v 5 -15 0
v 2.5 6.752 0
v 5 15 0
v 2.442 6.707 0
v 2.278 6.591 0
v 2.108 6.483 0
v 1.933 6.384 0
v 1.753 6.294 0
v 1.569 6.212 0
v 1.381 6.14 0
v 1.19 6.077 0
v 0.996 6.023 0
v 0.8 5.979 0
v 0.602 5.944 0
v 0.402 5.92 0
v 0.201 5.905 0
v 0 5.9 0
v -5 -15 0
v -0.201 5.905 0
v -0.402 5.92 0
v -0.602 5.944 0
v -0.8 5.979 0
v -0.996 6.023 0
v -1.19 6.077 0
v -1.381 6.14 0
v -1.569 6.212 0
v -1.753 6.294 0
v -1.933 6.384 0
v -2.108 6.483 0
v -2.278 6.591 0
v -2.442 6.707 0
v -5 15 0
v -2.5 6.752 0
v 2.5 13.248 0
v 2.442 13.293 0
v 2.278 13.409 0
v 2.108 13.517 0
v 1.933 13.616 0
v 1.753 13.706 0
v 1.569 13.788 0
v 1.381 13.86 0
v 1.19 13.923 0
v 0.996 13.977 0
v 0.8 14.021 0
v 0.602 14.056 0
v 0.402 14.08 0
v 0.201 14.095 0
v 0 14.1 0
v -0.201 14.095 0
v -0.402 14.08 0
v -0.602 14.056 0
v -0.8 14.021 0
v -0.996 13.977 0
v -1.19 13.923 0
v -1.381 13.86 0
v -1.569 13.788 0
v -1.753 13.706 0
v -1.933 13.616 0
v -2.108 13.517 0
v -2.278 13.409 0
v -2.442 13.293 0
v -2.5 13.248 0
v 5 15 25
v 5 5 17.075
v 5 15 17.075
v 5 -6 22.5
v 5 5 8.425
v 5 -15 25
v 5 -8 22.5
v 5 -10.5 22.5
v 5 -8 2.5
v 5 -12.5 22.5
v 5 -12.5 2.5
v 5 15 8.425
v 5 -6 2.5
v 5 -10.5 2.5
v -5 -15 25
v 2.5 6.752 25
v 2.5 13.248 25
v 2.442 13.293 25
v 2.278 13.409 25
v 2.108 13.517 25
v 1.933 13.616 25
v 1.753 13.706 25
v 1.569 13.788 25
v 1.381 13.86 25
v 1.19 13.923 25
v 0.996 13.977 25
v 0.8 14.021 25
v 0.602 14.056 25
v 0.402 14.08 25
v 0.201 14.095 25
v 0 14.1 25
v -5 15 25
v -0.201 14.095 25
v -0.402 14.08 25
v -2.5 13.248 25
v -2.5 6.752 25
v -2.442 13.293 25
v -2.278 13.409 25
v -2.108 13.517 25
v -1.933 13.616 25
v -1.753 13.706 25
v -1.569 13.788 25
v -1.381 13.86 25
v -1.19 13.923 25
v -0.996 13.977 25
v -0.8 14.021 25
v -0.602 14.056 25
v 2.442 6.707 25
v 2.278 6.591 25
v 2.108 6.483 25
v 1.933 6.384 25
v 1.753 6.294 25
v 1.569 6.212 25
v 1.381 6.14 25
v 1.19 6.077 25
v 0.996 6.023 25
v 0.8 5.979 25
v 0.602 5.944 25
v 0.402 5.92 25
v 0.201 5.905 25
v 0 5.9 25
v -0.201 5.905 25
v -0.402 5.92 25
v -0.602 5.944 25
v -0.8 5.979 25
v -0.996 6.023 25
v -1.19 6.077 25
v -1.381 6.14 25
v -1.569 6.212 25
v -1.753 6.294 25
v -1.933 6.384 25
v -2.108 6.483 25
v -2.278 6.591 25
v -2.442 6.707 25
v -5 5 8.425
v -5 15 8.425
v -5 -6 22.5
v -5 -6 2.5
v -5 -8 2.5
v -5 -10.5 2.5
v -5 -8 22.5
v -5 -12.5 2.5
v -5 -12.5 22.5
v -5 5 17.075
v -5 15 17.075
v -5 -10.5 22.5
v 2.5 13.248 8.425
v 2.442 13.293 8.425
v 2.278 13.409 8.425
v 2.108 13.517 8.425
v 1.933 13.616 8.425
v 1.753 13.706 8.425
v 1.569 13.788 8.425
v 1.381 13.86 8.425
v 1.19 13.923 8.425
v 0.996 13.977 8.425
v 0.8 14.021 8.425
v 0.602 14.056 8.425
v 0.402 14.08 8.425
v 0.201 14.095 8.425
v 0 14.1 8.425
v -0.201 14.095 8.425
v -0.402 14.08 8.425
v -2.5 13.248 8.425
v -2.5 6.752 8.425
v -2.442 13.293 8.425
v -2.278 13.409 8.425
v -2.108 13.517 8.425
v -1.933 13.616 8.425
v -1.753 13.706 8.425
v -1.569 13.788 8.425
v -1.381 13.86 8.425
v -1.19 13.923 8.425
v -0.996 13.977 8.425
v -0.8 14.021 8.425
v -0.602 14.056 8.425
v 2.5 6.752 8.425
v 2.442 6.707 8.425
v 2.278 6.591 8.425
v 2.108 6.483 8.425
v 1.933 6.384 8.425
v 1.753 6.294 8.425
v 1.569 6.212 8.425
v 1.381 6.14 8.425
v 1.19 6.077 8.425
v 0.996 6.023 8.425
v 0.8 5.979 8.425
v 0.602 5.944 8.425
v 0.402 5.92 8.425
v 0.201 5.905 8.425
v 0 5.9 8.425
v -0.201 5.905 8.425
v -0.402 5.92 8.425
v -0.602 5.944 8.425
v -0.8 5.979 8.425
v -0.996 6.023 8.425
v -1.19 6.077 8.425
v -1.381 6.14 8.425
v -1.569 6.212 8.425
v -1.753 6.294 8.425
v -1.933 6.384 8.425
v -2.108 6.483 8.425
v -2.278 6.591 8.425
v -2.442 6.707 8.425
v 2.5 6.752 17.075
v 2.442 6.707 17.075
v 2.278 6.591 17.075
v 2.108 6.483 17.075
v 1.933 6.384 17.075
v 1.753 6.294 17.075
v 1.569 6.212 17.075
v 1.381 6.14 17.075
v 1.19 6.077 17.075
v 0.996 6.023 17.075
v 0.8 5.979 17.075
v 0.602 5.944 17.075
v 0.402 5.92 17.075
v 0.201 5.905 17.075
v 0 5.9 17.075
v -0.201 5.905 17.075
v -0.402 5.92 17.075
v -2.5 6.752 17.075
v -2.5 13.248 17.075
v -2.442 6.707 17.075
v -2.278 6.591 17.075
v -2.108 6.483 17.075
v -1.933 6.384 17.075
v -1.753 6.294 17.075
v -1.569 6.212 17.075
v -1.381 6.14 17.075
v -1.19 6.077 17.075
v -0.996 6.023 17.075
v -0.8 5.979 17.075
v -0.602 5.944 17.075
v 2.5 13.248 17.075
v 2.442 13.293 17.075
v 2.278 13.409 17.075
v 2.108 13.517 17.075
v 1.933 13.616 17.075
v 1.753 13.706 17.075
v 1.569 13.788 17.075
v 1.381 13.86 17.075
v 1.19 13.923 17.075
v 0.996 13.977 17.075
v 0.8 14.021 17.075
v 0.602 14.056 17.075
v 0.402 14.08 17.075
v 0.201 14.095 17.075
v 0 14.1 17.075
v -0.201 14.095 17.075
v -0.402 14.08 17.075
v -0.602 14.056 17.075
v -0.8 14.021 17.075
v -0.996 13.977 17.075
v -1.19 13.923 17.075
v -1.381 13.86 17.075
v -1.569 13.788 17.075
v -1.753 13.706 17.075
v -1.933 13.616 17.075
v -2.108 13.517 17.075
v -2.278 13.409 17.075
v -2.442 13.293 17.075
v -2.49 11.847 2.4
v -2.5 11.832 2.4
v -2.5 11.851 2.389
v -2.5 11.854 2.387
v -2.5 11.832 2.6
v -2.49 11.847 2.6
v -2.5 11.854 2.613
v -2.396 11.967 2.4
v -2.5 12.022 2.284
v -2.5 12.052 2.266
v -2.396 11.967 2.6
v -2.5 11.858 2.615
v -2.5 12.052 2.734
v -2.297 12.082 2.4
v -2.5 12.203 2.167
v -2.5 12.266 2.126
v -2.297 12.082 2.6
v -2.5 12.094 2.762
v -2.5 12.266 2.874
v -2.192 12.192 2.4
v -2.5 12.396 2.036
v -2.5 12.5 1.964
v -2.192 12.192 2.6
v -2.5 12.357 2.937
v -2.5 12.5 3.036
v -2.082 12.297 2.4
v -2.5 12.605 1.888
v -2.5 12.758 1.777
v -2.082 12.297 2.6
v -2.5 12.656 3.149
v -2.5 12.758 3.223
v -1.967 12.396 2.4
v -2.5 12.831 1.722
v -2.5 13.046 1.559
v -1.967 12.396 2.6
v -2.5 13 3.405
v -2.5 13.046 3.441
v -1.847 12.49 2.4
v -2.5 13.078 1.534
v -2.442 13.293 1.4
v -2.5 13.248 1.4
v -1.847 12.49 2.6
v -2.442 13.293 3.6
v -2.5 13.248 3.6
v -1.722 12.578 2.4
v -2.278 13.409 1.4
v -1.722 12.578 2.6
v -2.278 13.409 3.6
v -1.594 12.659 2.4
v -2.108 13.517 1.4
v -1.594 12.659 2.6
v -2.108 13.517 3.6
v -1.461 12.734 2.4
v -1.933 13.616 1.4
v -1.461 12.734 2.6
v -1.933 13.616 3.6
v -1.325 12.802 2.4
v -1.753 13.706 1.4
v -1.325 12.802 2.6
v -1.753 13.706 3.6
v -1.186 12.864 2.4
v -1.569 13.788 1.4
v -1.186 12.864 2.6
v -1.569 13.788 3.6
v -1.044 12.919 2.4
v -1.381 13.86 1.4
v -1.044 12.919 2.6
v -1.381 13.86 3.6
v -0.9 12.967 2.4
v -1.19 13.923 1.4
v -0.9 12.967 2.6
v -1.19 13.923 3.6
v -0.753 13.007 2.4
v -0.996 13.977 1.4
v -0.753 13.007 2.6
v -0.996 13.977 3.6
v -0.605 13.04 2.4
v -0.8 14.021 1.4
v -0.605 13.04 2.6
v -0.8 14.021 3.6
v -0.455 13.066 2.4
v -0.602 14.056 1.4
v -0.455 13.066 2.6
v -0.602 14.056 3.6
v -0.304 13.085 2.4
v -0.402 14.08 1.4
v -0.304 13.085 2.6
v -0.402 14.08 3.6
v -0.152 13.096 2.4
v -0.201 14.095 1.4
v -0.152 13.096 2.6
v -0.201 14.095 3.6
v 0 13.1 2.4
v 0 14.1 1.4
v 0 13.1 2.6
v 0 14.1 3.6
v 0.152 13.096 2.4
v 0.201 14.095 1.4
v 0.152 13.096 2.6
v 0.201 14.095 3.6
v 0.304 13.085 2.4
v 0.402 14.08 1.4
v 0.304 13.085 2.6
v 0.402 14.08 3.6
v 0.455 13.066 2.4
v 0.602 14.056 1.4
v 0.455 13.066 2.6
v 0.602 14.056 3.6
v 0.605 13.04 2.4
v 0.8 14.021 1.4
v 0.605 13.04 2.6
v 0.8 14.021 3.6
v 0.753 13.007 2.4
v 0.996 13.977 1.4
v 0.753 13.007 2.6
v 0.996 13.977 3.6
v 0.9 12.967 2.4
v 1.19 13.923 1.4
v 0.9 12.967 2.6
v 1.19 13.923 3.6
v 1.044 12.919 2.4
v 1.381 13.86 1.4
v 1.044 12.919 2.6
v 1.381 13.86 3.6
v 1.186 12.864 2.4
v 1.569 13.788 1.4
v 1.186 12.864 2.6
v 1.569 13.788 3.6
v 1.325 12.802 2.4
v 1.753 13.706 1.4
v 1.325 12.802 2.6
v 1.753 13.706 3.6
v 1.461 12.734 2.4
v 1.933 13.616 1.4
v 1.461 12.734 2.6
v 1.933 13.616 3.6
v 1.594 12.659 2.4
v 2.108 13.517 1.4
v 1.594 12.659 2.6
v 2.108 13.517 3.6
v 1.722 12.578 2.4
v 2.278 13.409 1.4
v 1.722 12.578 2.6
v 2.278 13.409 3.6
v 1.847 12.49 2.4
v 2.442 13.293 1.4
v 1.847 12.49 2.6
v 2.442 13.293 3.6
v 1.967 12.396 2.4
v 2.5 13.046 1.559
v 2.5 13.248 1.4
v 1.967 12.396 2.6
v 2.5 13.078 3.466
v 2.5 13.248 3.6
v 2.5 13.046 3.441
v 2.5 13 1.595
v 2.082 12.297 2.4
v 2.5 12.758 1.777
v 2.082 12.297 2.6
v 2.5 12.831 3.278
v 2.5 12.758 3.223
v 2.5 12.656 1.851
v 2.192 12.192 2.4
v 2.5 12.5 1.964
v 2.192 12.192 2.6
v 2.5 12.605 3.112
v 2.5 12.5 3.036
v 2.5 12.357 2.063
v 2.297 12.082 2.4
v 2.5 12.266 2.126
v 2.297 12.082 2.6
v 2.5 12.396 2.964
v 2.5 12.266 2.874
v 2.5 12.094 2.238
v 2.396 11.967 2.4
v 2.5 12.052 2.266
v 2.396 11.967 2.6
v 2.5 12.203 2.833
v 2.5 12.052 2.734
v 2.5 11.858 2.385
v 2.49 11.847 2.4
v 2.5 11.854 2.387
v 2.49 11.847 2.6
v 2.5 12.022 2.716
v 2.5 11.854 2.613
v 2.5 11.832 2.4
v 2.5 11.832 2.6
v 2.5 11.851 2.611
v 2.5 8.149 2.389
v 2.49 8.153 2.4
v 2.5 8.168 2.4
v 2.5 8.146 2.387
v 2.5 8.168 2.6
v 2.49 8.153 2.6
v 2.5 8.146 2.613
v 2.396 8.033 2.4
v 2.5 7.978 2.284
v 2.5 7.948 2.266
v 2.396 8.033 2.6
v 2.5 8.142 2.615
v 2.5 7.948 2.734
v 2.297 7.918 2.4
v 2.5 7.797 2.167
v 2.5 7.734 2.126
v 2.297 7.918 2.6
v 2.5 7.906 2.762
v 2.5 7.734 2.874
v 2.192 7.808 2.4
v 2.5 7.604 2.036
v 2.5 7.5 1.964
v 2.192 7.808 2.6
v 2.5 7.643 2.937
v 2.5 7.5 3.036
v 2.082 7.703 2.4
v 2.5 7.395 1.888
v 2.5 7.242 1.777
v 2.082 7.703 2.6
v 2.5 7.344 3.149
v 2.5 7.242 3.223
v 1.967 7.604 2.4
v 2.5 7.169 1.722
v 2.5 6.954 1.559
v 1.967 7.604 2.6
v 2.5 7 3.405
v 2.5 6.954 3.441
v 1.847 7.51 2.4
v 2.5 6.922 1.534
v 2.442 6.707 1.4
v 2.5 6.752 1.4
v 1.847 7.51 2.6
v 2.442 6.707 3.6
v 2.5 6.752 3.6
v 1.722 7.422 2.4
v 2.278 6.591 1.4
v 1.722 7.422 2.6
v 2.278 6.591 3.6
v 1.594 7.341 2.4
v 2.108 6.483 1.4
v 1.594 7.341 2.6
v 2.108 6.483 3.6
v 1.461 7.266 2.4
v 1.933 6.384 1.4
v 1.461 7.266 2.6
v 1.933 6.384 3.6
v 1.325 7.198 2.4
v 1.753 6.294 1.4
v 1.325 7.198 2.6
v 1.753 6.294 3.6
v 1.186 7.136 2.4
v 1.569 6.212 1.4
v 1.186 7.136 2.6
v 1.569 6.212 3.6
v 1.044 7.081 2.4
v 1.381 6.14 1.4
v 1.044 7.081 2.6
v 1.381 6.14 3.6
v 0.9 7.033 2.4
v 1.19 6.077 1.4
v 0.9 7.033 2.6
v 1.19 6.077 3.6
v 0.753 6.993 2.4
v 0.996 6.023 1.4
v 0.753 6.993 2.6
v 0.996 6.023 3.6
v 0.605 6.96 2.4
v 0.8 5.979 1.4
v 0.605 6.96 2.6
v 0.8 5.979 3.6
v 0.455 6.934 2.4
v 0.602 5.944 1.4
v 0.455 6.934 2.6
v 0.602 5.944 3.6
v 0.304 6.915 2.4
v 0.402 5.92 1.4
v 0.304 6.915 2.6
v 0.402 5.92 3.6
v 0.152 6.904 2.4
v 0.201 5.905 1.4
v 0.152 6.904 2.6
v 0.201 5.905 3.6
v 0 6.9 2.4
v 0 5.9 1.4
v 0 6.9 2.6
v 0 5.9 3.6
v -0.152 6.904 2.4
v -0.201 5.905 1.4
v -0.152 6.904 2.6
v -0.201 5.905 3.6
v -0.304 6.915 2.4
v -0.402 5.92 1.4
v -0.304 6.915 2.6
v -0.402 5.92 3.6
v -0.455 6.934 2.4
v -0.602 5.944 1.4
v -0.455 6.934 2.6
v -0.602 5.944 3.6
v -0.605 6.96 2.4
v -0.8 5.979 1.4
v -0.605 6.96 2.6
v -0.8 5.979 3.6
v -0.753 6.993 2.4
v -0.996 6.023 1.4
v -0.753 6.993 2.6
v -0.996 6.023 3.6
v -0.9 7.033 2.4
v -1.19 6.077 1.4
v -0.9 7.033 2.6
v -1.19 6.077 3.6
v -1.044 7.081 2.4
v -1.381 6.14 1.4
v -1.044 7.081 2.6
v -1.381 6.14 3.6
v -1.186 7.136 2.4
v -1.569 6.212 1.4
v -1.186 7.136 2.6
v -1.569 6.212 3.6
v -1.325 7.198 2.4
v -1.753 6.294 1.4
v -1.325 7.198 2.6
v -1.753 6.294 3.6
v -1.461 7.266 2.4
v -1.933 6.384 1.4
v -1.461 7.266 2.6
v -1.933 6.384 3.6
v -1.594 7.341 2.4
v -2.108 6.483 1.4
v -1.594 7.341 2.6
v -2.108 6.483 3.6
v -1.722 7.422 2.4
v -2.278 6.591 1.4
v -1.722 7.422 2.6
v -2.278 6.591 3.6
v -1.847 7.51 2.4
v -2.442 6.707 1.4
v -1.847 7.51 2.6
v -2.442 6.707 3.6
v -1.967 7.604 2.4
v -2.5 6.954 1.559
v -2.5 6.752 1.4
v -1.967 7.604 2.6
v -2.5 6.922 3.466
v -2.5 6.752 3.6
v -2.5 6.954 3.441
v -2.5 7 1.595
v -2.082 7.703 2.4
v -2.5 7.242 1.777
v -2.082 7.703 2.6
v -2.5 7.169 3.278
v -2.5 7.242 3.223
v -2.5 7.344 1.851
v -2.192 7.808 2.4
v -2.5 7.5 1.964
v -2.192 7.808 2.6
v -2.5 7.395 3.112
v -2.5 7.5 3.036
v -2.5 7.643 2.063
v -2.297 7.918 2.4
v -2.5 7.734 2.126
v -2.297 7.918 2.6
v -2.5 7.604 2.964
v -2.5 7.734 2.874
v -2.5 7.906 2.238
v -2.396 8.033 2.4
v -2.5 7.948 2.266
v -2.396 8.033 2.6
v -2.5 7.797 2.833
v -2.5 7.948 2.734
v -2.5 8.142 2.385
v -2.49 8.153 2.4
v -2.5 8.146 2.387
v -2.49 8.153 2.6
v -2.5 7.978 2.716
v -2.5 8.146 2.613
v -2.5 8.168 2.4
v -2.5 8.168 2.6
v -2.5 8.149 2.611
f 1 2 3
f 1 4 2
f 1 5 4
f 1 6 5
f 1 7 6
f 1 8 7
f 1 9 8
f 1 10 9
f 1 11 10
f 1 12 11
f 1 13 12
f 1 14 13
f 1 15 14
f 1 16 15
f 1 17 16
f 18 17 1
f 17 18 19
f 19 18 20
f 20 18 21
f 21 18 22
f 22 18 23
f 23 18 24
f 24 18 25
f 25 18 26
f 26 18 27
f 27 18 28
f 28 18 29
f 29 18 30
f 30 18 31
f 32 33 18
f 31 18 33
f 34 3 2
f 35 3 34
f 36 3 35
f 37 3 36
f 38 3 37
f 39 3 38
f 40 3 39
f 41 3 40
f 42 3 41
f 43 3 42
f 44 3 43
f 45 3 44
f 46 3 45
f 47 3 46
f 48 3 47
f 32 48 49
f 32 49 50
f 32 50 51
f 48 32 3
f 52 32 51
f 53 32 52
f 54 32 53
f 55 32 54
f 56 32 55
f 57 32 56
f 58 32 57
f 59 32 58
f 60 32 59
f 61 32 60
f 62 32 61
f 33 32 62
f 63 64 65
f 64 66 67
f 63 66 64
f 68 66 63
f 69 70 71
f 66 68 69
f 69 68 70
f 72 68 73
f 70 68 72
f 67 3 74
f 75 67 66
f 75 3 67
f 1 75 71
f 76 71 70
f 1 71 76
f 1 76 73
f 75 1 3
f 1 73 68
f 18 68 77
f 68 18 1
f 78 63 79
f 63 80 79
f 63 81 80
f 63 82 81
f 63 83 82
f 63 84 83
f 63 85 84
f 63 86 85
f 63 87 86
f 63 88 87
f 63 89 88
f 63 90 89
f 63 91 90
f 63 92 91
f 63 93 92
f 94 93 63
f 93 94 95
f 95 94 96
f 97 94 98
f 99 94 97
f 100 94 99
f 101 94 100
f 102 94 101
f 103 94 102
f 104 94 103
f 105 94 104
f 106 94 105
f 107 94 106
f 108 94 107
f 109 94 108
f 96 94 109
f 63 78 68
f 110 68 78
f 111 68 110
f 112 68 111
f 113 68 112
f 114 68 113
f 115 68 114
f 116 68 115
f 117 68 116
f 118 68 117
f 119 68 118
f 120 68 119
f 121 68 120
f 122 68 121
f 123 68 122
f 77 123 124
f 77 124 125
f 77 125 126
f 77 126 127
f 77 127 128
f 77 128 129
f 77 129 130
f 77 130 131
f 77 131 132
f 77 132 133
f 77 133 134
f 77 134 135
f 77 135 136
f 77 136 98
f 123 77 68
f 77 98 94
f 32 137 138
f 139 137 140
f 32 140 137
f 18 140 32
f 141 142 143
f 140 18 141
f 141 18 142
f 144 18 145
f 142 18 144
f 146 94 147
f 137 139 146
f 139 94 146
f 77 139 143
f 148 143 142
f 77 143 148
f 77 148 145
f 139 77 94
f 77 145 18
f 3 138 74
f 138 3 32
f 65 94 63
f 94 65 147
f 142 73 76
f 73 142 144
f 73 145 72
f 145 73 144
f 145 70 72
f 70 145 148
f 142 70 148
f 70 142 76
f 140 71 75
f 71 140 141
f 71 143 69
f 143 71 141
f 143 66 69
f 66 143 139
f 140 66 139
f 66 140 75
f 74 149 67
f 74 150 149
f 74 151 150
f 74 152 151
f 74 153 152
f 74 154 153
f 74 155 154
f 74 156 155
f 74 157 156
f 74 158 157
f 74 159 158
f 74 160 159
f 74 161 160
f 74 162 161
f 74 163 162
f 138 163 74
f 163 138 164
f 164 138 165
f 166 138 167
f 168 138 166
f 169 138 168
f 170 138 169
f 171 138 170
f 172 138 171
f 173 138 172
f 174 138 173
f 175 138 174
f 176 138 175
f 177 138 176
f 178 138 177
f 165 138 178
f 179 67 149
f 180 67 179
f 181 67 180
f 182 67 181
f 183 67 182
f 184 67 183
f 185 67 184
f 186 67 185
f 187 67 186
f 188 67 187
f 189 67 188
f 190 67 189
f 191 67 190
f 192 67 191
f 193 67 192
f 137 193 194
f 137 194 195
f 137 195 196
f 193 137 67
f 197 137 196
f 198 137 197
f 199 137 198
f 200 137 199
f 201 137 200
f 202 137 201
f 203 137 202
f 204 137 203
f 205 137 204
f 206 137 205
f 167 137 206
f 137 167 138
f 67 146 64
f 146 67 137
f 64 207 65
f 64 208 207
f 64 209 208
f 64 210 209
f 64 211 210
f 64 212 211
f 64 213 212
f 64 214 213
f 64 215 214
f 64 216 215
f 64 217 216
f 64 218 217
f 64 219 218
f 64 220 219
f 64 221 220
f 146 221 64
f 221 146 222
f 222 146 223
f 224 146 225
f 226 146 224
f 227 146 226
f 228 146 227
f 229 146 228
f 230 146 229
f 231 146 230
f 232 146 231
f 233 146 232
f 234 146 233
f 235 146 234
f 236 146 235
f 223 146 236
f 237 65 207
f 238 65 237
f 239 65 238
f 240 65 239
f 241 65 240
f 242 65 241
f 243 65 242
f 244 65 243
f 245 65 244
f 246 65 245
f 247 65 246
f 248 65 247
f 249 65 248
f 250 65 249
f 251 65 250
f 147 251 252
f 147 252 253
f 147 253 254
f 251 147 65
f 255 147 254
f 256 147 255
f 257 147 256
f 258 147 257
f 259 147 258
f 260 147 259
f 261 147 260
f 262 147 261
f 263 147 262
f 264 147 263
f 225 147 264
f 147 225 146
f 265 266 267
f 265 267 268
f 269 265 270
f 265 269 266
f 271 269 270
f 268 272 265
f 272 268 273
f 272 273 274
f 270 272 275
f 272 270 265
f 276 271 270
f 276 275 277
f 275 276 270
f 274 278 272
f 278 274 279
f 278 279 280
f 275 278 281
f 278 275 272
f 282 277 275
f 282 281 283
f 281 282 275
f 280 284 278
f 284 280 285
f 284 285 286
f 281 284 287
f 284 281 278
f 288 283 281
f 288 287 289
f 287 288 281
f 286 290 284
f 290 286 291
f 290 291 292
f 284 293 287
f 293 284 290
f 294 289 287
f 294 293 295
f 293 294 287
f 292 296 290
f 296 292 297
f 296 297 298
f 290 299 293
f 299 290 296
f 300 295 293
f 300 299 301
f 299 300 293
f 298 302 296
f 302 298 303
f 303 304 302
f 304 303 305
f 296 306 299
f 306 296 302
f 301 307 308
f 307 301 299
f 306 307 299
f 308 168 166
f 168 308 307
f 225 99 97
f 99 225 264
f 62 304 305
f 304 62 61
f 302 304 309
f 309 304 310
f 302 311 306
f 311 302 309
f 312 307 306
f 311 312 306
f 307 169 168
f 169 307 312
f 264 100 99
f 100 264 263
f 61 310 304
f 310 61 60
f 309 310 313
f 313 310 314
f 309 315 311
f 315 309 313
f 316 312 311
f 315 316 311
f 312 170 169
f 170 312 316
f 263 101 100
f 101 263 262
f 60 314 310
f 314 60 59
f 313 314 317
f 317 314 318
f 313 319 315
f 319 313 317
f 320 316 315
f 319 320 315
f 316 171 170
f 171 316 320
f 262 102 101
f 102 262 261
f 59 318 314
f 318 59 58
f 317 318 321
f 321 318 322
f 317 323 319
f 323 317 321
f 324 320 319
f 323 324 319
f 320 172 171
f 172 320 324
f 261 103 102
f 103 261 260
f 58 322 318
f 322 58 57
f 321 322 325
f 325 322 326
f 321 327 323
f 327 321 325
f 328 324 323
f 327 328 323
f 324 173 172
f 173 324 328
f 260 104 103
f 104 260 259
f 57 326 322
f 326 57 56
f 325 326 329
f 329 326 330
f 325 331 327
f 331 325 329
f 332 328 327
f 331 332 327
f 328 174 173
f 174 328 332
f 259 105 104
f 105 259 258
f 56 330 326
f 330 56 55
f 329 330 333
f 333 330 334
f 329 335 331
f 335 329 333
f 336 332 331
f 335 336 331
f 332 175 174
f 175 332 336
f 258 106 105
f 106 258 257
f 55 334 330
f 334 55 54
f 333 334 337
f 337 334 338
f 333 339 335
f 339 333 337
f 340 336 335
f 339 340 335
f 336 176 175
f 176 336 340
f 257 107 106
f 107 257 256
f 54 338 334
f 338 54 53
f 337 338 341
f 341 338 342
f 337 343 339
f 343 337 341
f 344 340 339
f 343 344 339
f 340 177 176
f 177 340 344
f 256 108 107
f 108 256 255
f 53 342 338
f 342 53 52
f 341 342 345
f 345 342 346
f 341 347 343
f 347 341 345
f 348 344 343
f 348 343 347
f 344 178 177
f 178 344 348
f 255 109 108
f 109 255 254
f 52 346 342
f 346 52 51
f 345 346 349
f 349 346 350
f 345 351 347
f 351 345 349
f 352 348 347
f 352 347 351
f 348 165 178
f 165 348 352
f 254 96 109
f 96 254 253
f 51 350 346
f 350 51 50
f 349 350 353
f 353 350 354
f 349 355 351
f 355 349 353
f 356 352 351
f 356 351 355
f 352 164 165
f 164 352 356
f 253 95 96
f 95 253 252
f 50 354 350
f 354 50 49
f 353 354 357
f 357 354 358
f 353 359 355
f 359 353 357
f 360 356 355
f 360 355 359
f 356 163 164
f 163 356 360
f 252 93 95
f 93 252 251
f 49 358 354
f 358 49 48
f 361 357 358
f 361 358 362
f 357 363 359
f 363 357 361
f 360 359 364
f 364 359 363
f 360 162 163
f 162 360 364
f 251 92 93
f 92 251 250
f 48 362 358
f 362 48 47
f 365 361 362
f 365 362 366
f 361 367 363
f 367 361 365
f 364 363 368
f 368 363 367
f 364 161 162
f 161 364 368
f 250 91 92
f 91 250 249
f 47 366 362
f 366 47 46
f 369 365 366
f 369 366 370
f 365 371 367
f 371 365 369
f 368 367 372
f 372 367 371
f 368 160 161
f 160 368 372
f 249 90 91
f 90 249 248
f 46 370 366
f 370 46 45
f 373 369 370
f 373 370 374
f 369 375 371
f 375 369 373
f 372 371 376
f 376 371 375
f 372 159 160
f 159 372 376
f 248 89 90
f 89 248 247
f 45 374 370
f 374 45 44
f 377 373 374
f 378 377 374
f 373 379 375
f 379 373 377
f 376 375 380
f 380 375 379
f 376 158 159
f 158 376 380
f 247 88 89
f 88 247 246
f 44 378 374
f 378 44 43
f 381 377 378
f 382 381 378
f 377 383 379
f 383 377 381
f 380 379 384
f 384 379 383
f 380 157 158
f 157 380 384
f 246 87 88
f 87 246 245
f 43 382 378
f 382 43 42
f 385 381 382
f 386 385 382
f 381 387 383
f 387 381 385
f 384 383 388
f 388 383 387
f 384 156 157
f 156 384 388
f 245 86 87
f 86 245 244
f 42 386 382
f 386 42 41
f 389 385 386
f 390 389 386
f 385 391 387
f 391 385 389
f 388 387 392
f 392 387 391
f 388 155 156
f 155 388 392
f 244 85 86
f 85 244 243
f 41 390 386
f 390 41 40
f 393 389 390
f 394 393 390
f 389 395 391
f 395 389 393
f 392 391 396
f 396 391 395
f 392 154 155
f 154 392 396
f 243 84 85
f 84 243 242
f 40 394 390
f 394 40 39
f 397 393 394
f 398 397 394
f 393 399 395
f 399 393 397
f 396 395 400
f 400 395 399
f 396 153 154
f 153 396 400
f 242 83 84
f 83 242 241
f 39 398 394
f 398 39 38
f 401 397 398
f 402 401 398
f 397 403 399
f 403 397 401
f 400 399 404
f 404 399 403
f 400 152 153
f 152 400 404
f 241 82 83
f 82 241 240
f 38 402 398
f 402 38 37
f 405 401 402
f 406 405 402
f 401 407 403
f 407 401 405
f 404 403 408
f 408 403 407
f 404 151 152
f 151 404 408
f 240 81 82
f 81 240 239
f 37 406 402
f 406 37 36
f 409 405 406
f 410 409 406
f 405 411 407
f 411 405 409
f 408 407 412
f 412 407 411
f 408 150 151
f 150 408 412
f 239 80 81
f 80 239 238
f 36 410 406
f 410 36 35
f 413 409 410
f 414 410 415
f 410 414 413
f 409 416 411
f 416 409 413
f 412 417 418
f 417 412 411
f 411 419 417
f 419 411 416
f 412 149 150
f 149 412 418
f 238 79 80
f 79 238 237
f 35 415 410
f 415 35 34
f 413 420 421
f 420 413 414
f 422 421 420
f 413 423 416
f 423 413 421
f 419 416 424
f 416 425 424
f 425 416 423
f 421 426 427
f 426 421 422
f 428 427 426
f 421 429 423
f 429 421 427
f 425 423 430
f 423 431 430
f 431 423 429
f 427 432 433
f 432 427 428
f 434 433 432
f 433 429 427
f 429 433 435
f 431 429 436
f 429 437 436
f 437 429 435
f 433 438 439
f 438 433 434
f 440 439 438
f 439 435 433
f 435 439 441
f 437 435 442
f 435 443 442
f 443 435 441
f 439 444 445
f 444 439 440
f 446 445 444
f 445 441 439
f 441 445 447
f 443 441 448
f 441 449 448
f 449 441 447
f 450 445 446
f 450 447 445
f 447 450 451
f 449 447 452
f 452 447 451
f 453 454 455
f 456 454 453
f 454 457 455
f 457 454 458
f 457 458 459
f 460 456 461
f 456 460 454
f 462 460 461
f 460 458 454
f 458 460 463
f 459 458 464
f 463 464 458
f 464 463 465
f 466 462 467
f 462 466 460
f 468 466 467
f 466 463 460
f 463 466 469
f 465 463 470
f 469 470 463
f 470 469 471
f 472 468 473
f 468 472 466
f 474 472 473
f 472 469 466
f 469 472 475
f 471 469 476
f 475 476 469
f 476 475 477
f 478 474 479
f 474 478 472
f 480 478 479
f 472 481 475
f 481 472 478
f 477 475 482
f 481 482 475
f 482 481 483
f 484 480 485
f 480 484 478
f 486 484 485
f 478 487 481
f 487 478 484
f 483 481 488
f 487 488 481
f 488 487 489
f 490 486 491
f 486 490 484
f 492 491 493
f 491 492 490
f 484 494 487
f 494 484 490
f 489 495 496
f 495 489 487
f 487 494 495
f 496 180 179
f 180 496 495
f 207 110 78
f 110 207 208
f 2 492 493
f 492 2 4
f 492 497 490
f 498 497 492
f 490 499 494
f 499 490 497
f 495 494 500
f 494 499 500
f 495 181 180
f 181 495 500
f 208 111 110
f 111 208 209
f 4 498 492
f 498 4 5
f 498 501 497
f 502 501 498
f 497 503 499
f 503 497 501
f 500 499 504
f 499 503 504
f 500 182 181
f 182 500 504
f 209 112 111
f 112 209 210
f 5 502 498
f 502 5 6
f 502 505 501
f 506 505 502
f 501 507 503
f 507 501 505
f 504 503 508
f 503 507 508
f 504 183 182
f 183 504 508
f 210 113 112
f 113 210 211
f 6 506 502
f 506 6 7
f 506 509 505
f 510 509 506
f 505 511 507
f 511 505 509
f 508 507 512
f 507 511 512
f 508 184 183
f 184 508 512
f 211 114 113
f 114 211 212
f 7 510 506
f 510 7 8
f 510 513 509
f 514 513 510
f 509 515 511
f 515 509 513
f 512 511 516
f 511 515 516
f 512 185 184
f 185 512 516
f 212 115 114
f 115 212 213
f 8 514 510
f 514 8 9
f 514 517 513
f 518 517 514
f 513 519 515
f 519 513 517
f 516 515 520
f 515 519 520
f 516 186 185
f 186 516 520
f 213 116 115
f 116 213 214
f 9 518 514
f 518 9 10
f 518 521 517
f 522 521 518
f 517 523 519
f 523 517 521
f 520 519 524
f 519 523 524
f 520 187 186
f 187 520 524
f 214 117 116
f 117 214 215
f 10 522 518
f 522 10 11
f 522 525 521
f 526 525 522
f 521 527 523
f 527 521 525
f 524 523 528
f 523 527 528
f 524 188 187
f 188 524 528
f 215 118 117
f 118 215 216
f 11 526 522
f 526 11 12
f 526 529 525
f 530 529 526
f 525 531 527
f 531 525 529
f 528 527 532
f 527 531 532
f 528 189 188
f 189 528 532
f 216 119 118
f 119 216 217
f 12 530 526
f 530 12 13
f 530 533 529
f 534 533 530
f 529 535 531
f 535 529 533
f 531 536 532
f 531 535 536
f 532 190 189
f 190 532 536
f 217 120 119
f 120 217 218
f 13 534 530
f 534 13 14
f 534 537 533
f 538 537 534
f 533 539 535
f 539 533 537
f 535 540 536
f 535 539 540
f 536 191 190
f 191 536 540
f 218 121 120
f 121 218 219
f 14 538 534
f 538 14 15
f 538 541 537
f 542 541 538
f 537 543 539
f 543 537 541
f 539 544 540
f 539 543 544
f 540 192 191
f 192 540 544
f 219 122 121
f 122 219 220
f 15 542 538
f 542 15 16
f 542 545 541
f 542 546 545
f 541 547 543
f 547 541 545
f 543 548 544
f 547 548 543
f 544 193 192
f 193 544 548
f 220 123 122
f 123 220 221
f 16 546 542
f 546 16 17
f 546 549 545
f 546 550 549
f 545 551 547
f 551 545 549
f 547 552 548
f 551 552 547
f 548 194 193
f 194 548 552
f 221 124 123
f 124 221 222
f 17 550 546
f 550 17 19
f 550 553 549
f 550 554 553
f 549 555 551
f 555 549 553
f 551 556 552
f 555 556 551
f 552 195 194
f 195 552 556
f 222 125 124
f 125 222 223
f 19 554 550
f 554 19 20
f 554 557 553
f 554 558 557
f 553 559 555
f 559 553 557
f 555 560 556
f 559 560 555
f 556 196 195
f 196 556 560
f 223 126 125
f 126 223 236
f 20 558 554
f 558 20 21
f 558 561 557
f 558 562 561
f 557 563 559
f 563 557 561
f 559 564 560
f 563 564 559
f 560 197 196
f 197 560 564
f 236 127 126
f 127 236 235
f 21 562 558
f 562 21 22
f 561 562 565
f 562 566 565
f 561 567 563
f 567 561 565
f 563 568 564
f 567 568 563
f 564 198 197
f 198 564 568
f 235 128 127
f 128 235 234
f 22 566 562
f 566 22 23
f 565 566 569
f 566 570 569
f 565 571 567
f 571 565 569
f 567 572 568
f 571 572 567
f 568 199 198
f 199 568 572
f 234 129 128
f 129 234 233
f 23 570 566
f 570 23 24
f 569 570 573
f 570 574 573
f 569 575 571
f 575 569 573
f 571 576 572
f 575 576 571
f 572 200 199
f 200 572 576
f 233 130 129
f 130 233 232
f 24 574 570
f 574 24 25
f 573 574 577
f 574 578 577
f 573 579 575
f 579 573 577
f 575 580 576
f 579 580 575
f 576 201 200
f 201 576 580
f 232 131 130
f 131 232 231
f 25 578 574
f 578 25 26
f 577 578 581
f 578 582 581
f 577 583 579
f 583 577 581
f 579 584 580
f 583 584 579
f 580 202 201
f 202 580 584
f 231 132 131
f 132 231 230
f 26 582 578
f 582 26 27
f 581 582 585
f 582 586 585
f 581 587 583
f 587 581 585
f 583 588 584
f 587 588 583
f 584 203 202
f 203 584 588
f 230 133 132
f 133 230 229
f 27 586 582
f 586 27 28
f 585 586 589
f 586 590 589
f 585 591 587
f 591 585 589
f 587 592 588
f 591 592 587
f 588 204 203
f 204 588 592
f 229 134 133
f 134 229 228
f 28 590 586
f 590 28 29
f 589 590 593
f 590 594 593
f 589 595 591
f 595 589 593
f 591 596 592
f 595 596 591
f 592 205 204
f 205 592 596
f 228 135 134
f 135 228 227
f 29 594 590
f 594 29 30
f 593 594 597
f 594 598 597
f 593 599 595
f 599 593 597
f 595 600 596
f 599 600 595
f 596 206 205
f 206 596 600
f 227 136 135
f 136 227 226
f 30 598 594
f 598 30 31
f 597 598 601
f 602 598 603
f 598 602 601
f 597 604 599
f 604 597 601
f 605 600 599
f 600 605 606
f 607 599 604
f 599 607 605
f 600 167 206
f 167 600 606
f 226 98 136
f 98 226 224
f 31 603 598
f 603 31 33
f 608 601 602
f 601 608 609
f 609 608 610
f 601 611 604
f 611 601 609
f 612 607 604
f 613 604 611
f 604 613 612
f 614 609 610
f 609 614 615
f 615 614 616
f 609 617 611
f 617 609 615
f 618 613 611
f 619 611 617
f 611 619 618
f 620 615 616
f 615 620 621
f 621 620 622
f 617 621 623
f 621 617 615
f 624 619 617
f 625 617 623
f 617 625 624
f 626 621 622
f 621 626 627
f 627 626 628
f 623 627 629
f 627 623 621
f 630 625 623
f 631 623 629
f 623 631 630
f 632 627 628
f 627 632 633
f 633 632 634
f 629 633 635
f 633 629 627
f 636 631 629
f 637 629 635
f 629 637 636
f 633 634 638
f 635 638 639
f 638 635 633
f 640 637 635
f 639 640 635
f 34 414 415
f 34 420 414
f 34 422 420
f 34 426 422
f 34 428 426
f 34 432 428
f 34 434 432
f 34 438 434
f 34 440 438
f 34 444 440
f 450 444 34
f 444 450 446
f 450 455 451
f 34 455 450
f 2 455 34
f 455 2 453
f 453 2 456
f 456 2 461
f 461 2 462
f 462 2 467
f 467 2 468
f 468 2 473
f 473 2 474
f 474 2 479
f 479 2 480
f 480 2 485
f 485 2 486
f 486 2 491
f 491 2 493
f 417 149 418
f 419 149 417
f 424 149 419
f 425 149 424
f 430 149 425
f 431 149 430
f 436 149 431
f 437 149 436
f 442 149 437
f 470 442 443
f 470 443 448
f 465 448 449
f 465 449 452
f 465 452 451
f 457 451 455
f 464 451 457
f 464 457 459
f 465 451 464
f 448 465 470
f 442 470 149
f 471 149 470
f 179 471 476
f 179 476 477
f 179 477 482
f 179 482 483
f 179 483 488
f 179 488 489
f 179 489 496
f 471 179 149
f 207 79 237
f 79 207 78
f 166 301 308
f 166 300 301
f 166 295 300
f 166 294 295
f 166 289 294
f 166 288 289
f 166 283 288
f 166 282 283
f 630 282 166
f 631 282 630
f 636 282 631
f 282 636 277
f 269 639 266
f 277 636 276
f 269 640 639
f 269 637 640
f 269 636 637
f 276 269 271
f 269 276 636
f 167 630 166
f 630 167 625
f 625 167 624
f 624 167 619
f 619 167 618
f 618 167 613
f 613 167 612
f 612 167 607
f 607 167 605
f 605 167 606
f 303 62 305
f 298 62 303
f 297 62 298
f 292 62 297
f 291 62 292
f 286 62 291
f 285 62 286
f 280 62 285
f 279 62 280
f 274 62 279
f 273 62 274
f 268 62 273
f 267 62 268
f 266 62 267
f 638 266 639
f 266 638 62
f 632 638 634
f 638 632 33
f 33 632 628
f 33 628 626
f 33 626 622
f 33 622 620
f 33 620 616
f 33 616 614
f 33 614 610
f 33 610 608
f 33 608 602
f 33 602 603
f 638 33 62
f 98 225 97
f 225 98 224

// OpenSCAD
difference()
{
    difference()
    {
        difference()
        {
            difference()
            {
                linear_extrude(height = 25.0, twist = 0.0, scale = 1.0, slices = 1, center = false)
                {
                    scale([10.0, 30.0])
                    {
                        M22();
                    }
                }
                translate([0.0, -11.5, 2.5])
                {
                    linear_extrude(height = 20.0, twist = 0.0, scale = 1.0, slices = 1, center = false)
                    {
                        scale([10.0, 2.0])
                        {
                            M22();
                        }
                    }
                }
            }
            translate([0.0, 4.5, 0.0])
            {
                translate([0.0, -11.5, 2.5])
                {
                    linear_extrude(height = 20.0, twist = 0.0, scale = 1.0, slices = 1, center = false)
                    {
                        scale([10.0, 2.0])
                        {
                            M22();
                        }
                    }
                }
            }
        }
        translate([0.0, 10.0, 8.425])
        {
            linear_extrude(height = 8.65, twist = 0.0, scale = 1.0, slices = 1, center = false)
            {
                scale([10.0, 10.0])
                {
                    M22();
                }
            }
        }
    }
    translate([0.0, 10.0, 0.0])
    {
        intersection()
        {
            rotate_extrude(angle = 360.0, $fn = 128)
            {
                M130();
            }
            translate([0.0, 0.0, -0.2])
            {
                linear_extrude(height = 310.4, twist = 0.0, scale = 1.0, slices = 1, center = false)
                {
                    scale([5.0, 10.0])
                    {
                        M22();
                    }
                }
            }
        }
    }
}

module M130()
{
    polygon
    (
        points =
        [
            [0.0, -0.2], 
            [4.1, -0.2], 
            [4.1, 1.4], 
            [3.1, 2.4], 
            [3.1, 2.6], 
            [4.1, 3.6], 
            [4.1, 305.2], 
            [0.0, 305.2]
        ],
        paths =
        [
            [0, 1, 2, 3, 4, 5, 6, 7]
        ]
    );
}

module M22()
{
    polygon
    (
        points =
        [
            [-0.5, -0.5], 
            [0.5, -0.5], 
            [0.5, 0.5], 
            [-0.5, 0.5]
        ],
        paths =
        [
            [0, 1, 2, 3]
        ]
    );
}
